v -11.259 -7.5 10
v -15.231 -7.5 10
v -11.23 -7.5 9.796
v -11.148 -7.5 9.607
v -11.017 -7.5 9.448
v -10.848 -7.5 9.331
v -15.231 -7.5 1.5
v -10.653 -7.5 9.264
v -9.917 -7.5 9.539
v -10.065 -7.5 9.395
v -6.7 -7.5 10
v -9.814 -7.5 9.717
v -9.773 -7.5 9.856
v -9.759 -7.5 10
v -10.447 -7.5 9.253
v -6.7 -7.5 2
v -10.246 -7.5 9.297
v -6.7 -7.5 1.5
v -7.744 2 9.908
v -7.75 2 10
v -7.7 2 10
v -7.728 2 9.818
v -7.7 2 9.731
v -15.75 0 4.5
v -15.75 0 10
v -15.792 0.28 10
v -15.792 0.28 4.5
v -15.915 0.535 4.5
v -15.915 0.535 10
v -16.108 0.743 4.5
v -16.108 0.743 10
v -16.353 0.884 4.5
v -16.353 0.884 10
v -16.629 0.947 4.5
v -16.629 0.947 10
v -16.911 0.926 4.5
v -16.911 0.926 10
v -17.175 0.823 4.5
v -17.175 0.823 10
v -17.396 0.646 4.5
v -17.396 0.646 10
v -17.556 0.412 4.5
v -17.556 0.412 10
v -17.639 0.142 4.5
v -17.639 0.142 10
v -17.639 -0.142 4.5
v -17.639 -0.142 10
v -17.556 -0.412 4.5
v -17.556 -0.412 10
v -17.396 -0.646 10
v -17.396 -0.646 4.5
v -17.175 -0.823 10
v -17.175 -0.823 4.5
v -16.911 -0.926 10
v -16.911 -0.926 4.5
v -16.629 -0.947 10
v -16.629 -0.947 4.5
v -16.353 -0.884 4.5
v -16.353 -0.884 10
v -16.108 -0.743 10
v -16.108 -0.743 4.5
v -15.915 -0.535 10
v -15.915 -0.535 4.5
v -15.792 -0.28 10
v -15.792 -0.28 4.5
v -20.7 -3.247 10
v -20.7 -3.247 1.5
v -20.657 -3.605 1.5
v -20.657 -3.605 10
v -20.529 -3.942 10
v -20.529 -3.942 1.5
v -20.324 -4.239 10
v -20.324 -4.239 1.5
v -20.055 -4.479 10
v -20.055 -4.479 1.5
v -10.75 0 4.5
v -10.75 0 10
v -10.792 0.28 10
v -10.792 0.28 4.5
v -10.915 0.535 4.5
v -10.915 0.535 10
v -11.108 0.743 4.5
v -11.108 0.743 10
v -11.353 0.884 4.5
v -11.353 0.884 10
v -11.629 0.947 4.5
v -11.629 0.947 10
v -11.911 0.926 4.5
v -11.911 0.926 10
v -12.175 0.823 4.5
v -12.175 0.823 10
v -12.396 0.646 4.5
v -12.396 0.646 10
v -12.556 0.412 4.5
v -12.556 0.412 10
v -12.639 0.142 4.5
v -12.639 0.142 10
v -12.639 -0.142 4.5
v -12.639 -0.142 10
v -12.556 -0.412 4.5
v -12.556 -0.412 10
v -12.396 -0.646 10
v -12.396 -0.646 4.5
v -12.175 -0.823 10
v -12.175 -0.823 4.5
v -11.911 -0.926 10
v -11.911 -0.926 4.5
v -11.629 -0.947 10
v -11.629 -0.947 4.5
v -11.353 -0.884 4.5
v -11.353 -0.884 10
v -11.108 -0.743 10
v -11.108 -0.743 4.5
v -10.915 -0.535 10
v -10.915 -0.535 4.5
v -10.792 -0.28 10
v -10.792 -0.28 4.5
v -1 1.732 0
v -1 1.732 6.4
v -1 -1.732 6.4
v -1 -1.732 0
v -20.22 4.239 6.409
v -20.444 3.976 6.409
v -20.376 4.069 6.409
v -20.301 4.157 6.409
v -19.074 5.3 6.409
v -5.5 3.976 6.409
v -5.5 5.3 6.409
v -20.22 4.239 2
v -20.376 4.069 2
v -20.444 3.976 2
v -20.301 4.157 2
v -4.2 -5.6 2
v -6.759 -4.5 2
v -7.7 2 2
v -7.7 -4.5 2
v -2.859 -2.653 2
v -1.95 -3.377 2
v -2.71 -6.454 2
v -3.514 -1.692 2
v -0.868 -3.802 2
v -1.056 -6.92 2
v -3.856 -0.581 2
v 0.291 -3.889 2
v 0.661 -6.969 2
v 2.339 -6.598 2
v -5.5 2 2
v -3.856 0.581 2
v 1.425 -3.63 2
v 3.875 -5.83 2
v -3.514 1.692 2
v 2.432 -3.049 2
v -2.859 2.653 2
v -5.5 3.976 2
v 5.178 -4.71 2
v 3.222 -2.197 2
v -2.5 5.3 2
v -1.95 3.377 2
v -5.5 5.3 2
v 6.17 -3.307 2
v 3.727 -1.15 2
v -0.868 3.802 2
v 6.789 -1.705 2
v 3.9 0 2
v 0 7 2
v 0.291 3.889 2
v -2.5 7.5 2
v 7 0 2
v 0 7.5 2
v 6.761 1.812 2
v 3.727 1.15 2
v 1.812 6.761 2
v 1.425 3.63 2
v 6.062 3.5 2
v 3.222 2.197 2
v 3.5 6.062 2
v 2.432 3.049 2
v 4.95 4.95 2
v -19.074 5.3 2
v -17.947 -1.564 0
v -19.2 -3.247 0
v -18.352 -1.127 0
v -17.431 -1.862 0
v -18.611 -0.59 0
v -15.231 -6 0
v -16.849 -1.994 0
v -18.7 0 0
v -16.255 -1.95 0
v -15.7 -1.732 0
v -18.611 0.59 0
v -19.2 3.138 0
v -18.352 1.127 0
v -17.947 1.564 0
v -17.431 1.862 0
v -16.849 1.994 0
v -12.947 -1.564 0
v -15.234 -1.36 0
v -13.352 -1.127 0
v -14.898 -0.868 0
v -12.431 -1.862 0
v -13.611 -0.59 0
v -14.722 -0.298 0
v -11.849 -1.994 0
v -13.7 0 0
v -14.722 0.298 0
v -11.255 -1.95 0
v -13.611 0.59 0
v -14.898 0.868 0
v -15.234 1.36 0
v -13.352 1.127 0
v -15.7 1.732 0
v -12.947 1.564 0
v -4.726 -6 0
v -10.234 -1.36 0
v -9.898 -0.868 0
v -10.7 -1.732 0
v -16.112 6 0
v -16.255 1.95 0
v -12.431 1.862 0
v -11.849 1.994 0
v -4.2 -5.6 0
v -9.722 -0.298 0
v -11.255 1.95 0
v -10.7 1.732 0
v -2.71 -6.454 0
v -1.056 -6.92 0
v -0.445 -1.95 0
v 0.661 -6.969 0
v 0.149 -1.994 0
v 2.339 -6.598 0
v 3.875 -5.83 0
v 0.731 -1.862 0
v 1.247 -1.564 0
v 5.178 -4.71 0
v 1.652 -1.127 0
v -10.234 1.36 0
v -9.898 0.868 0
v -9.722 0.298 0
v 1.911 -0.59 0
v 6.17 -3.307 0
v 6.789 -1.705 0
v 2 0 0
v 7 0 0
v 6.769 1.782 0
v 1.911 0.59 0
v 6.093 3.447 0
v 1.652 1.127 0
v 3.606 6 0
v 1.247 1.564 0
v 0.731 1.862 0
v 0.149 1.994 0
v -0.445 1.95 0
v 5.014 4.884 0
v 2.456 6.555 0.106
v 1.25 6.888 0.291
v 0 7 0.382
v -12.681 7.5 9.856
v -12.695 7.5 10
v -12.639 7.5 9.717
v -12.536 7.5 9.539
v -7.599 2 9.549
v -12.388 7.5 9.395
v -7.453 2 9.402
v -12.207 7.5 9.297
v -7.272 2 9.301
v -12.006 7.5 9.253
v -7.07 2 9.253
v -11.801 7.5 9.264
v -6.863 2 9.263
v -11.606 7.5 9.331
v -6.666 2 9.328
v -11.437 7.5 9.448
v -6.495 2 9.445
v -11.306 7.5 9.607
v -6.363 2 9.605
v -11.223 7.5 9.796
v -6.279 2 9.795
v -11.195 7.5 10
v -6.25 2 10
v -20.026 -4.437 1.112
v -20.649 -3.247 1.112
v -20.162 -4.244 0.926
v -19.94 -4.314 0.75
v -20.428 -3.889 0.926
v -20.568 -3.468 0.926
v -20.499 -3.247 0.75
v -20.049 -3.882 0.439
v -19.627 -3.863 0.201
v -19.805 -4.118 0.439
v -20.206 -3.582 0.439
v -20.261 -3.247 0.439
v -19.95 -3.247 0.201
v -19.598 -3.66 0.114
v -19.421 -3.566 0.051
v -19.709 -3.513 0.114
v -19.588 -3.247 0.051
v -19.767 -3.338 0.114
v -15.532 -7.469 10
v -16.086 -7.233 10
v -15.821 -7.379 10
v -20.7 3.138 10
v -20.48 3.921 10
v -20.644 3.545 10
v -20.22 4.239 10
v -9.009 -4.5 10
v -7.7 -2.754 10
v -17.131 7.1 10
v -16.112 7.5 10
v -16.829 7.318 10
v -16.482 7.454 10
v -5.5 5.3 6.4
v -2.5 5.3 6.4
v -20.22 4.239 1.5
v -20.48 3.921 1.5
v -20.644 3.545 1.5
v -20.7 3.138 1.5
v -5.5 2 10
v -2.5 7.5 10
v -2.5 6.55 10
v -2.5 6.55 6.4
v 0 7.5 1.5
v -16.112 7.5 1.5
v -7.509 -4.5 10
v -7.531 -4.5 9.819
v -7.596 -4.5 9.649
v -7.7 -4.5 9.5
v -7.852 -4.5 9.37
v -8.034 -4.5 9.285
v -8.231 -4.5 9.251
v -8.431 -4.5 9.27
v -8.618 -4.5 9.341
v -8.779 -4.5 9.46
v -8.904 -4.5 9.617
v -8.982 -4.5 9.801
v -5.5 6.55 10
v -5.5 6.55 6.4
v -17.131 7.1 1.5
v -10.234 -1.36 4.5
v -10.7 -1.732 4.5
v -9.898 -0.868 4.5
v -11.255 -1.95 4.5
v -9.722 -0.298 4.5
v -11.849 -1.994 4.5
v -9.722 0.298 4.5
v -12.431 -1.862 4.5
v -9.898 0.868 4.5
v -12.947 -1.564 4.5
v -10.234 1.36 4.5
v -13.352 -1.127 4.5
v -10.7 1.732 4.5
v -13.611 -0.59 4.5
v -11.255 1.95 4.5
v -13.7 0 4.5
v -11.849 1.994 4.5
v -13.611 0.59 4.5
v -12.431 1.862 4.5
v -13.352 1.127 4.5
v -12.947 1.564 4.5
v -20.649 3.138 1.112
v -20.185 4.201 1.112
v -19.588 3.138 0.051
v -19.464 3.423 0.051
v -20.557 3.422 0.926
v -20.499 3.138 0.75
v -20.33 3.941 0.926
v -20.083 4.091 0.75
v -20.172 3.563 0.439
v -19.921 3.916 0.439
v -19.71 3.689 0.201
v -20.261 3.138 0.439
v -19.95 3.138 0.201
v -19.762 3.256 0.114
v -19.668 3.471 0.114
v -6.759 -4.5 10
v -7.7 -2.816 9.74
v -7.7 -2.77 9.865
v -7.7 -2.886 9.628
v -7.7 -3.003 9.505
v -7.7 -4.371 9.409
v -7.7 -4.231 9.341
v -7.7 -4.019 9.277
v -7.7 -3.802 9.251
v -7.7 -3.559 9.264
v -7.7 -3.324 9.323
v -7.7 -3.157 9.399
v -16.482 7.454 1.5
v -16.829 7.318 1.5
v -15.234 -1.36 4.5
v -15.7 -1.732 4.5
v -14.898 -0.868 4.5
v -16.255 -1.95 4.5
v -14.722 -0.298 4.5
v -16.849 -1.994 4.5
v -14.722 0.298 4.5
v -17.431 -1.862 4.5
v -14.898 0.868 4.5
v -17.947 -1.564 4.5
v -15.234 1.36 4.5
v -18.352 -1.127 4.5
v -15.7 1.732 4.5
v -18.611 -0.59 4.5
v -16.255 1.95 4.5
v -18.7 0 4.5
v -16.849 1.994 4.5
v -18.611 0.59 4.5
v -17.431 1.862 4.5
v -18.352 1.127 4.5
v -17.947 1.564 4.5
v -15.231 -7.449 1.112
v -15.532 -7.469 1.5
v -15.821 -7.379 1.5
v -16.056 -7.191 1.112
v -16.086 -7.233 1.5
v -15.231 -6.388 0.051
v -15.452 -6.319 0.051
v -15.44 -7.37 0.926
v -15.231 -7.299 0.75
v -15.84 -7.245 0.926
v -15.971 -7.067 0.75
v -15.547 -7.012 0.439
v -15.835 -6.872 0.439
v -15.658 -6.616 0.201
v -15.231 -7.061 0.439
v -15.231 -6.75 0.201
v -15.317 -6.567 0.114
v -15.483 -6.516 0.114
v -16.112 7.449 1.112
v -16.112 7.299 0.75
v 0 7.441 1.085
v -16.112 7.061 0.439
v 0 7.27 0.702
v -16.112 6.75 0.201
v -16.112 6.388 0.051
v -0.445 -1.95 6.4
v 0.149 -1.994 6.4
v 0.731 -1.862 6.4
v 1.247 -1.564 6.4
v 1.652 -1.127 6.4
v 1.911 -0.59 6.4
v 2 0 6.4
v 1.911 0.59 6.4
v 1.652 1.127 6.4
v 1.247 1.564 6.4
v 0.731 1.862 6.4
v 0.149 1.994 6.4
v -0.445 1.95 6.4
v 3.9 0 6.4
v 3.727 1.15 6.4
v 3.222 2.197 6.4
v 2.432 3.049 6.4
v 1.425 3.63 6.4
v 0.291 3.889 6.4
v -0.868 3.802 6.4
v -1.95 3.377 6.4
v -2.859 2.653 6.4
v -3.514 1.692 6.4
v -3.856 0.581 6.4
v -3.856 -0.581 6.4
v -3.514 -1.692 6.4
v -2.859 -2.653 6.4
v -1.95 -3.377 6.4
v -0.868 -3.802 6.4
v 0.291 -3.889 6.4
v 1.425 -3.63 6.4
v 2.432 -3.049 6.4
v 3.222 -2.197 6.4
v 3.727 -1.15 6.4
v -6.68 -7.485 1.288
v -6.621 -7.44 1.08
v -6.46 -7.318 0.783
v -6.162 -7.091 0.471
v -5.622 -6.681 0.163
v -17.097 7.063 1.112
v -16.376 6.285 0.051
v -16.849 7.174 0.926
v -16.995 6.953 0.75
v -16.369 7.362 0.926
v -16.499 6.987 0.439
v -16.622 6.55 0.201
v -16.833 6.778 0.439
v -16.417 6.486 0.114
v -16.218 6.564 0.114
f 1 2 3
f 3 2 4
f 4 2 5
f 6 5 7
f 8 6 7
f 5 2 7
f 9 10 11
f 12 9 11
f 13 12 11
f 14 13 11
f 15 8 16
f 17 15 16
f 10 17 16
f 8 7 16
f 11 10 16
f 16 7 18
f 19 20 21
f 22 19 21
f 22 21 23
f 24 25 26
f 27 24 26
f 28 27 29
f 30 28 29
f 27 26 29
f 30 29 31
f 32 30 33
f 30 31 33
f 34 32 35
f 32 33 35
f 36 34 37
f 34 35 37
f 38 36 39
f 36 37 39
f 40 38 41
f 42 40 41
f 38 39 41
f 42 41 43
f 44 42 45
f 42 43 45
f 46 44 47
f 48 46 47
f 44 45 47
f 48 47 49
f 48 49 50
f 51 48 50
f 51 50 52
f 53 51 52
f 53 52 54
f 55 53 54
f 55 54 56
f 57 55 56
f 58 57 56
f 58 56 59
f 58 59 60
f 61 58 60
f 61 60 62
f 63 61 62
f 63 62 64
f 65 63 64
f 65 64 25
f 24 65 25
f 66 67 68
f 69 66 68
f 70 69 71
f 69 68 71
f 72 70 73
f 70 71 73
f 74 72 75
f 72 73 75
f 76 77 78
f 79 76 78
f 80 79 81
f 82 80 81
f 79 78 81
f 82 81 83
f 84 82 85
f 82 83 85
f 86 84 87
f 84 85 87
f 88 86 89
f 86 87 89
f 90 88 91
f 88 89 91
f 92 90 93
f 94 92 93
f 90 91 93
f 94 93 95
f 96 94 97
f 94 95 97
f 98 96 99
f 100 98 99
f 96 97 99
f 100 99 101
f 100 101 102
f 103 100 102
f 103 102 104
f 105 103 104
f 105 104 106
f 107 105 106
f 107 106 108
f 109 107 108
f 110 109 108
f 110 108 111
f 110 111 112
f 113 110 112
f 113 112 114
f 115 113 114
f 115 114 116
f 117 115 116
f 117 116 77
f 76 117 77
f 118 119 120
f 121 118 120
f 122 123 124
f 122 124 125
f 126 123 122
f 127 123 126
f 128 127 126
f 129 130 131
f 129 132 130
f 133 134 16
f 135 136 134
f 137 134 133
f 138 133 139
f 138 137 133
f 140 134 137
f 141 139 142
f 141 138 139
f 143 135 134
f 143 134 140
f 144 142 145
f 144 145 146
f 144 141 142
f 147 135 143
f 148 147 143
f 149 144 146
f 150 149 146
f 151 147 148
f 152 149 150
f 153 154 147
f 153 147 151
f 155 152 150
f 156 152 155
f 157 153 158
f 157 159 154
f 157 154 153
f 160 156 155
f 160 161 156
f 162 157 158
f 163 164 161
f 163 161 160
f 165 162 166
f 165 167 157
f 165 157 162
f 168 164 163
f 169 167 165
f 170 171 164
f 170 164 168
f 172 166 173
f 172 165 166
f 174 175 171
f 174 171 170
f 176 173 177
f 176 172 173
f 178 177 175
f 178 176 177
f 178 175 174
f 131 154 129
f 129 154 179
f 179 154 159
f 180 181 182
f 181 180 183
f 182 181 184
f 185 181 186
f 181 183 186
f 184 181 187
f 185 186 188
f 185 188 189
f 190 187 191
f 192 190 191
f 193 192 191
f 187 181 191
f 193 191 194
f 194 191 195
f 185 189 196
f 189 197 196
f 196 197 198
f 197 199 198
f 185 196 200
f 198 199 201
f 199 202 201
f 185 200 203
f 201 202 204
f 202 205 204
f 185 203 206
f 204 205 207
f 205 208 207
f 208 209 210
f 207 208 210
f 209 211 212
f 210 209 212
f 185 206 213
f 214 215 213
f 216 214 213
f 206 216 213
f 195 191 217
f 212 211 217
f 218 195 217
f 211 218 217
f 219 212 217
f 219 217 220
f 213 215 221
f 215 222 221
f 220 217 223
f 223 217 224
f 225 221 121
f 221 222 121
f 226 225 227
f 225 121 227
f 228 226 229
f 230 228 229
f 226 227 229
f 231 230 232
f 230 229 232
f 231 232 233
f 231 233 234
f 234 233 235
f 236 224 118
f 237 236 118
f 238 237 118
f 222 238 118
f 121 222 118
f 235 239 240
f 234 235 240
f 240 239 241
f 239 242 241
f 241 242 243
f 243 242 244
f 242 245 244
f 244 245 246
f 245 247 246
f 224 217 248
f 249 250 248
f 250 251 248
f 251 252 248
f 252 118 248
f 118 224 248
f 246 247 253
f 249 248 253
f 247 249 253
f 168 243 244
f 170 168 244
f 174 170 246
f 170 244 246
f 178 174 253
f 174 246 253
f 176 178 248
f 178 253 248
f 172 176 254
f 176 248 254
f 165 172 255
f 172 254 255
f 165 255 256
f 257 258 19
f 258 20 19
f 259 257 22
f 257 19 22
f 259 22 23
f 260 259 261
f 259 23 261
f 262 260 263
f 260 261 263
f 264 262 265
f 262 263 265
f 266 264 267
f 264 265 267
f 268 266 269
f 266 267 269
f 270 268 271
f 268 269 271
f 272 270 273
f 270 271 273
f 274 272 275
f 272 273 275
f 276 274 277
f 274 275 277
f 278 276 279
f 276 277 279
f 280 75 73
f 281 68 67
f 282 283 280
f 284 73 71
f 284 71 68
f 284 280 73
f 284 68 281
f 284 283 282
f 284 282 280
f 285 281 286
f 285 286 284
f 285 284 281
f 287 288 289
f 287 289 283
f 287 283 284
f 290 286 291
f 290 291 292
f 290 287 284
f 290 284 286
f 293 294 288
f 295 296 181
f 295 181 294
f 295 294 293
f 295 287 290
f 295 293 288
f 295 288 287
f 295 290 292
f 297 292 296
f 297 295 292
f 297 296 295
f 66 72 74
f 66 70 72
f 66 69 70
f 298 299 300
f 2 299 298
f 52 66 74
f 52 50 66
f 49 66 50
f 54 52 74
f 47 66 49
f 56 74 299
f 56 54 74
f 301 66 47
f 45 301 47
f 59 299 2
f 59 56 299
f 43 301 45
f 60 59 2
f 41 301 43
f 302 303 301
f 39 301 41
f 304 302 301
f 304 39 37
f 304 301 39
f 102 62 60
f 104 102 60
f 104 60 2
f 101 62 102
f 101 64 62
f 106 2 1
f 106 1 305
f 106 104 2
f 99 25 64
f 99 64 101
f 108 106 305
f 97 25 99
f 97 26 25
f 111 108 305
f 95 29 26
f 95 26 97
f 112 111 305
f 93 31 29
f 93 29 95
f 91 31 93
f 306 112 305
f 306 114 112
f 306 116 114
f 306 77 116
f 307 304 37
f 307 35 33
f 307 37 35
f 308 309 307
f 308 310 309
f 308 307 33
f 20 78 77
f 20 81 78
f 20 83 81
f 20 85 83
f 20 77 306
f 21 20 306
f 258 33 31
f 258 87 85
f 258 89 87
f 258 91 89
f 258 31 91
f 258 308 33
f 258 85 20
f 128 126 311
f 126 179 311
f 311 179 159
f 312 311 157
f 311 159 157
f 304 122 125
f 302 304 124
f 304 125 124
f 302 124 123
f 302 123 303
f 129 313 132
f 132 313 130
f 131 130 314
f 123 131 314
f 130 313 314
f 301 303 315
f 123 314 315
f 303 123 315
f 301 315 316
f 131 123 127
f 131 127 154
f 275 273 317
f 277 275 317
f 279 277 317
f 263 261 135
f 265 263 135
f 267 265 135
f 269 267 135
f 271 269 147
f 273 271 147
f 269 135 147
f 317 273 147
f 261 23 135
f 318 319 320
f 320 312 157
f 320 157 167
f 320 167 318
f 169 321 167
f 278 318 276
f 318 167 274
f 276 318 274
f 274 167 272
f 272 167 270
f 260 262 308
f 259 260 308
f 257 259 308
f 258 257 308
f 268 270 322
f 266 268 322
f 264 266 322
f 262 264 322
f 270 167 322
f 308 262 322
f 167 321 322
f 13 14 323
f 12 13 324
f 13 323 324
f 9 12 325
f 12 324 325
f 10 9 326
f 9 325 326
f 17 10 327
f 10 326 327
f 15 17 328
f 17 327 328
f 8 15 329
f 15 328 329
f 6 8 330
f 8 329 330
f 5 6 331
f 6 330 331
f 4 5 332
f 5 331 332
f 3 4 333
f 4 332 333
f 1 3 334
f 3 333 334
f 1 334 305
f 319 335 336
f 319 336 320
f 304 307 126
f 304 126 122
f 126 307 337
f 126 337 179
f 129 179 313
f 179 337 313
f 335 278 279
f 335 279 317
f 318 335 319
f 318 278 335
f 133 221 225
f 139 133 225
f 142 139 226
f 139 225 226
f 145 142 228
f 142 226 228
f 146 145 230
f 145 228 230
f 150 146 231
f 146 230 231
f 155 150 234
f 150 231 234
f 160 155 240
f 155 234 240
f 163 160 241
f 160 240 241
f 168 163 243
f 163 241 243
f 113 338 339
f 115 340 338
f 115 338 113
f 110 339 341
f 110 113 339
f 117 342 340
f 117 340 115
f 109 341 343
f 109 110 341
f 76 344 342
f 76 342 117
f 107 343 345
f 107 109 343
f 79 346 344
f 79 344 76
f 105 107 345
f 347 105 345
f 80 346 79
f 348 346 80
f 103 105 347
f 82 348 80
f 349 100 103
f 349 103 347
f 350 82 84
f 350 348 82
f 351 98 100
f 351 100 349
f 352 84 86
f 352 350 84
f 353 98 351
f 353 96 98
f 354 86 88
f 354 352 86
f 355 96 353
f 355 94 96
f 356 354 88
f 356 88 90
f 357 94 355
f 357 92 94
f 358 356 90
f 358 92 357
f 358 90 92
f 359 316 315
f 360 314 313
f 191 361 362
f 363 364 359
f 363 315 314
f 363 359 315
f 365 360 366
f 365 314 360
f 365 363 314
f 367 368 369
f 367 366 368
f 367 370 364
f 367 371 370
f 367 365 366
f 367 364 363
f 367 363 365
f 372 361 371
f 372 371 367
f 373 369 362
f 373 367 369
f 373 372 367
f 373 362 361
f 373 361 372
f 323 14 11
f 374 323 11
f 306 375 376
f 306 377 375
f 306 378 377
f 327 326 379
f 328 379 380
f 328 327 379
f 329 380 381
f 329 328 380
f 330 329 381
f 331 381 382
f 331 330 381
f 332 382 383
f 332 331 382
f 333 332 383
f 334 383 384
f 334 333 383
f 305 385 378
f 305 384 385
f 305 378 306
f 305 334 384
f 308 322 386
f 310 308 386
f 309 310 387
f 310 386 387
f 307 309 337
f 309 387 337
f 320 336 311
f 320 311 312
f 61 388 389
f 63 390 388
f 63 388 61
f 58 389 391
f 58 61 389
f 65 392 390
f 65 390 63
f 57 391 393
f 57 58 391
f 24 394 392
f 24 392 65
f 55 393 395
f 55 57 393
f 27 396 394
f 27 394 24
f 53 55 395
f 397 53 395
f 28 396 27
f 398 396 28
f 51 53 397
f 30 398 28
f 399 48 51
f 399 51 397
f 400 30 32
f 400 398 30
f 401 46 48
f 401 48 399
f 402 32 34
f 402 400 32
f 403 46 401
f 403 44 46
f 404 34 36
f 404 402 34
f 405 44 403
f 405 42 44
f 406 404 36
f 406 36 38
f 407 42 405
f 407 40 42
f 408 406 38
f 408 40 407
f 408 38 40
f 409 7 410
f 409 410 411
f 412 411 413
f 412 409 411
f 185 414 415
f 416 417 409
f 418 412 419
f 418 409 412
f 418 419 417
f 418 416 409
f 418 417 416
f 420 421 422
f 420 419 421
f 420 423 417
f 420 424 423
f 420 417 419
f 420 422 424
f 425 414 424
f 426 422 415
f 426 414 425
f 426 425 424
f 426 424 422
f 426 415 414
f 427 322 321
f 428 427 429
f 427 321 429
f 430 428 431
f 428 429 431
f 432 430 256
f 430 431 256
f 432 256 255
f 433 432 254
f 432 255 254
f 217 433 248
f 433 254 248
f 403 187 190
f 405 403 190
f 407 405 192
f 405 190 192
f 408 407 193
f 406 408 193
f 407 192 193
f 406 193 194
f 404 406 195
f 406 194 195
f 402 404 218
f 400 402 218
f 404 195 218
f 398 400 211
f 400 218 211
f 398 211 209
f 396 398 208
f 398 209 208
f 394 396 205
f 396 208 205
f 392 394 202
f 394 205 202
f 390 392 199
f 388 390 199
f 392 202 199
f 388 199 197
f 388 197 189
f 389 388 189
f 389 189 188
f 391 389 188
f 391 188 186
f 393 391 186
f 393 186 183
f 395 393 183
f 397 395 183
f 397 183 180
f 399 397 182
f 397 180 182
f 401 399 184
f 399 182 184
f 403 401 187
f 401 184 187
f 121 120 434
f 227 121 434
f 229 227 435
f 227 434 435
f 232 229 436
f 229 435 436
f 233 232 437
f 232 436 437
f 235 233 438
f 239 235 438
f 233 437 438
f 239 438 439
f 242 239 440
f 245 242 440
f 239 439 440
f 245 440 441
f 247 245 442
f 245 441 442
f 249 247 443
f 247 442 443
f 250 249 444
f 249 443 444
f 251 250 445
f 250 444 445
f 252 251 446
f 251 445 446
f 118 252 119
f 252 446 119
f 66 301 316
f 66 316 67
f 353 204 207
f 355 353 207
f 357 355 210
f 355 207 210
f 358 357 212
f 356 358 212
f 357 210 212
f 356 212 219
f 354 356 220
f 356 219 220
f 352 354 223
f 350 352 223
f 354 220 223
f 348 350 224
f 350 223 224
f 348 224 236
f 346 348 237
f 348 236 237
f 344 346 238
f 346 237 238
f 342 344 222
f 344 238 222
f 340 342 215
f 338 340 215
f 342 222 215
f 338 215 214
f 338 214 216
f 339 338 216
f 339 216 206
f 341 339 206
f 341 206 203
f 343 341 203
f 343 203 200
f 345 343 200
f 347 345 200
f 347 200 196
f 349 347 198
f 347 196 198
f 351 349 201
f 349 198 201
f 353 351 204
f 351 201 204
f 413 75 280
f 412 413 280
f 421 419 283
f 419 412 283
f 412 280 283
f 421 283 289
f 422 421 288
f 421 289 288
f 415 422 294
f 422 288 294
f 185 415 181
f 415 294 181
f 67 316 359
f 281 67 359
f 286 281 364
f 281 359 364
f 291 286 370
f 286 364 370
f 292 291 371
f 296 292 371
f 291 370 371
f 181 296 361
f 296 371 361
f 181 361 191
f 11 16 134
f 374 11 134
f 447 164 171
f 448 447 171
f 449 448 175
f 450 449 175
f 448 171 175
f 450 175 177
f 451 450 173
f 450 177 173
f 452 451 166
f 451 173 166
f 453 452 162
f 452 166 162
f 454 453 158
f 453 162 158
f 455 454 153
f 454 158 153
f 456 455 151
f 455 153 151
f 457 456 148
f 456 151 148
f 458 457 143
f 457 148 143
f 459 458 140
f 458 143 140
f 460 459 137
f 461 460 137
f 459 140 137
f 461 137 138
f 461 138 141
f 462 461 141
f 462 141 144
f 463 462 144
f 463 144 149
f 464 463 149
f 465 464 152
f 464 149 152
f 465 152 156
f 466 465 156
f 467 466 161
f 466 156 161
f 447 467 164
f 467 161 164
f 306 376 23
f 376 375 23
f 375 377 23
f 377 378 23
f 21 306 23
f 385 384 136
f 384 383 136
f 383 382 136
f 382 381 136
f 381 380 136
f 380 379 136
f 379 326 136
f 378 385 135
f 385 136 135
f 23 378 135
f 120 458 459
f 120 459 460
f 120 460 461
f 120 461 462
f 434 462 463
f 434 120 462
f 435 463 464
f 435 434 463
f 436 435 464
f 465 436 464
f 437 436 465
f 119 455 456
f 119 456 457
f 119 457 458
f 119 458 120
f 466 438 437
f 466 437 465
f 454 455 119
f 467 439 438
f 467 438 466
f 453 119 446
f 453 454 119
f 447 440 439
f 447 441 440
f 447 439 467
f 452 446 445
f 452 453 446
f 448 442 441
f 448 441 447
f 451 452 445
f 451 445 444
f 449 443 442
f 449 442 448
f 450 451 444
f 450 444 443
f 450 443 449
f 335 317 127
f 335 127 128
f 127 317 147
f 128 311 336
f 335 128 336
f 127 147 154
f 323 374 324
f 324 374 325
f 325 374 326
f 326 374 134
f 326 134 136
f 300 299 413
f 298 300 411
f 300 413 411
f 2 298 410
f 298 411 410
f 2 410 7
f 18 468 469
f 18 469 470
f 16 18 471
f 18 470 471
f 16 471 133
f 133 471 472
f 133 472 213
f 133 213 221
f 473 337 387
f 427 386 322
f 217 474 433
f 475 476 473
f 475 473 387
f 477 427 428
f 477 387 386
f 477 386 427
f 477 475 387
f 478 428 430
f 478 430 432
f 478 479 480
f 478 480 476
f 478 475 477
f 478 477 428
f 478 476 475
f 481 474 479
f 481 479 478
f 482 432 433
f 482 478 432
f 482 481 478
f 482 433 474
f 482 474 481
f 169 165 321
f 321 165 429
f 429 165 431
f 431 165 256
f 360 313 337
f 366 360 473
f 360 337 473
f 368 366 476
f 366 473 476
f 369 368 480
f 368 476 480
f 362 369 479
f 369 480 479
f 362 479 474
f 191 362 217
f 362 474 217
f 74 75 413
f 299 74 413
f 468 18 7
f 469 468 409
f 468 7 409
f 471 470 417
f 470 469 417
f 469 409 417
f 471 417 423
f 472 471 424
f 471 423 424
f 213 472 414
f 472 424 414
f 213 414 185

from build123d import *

# Parameters (mm, degrees)
BOSS_EXTRUDE1_DEPTH      = 2
BOSS_EXTRUDE2_DEPTH      = 8
SKETCH24_R               = 3.9
BOSS_EXTRUDE5_DEPTH      = 4.4
SKETCH30_W               = 4.40861202
SKETCH30_H               = 1.324178481
CUT_EXTRUDE12_DEPTH      = 16
CUT_EXTRUDE11_DEPTH      = 23.928148639
FILLET1_R                = 1.5
SKETCH34_R               = 0.75
CUT_EXTRUDE13_DEPTH      = 8
SKETCH35_R               = 0.75
CUT_EXTRUDE14_DEPTH      = 3
CUT_EXTRUDE14_DEPTH_BACK = 8
SKETCH36_R               = 0.95
CUT_EXTRUDE15_DEPTH      = 8
SKETCH37_R               = 2
CUT_EXTRUDE16_DEPTH      = 4.5
SKETCH38_W               = 3
SKETCH38_H               = 1.25
CUT_EXTRUDE17_DEPTH      = 3.6


with BuildPart() as part:
    # Sketch2 → Boss-Extrude1 (new body)
    with BuildSketch(Plane.XY):
        with BuildLine():
            Line((-2.5, 7.5), (-16.7, 7.5))
            Line((-16.7, 7.5), (-20.7, 3.793442666))
            Line((-20.7, 3.793442666), (-20.7, -4.031648778))
            Line((-20.7, -4.031648778), (-15.7, -7.5))
            Line((-15.7, -7.5), (-6.7, -7.5))
            Line((-6.7, -7.5), (-4.2, -5.6))
            ThreePointArc((-4.2, -5.6), (3.130495168, -6.260990337), (7, 0))
            ThreePointArc((7, 0), (4.949747468, 4.949747468), (0, 7))
            Line((0, 7), (0, 7.5))
            Line((0, 7.5), (-2.5, 7.5))
        make_face()
    extrude(amount=BOSS_EXTRUDE1_DEPTH)

    # Sketch4 → Boss-Extrude2 (add)
    with BuildSketch(Plane.XY.offset(2)):
        Polygon((-15.7, -7.5), (-6.7, -7.5), (-6.759079174, -4.5), (-7.7, -4.5), (-7.7, 2), (-5.5, 2), (-5.5, 5.3), (-2.5, 5.3), (-2.5, 7.5), (-16.7, 7.5), (-20.7, 3.793442666), (-20.7, -4.031648778), align=None)
    extrude(amount=BOSS_EXTRUDE2_DEPTH)

    # Sketch24 → Boss-Extrude5 (add)
    with BuildSketch(Plane.XY.offset(2)):
        Circle(SKETCH24_R)
    extrude(amount=BOSS_EXTRUDE5_DEPTH)

    # Sketch30 → Cut-Extrude12 (cut)
    with BuildSketch(Plane(origin=(-5.5, 0, 0), x_dir=(0, 0, -1), z_dir=(1, 0, 0))):
        with Locations((-4.20430601, 4.63791076)):
            Rectangle(SKETCH30_W, SKETCH30_H)
    extrude(amount=-CUT_EXTRUDE12_DEPTH, mode=Mode.SUBTRACT)

    # Sketch28 → Cut-Extrude11 (cut, through all)
    with BuildSketch(Plane.XY.offset(6.4)):
        with BuildLine():
            Line((-1, 1.732050808), (-1, -1.732050808))
            ThreePointArc((-1, -1.732050808), (2, 0), (-1, 1.732050808))
        make_face()
    extrude(amount=-CUT_EXTRUDE11_DEPTH, mode=Mode.SUBTRACT)

    # Fillet1
    # the kernel refuses this fillet: 1.5 mm, written as the material it takes off along each edge
    with BuildSketch(Plane(origin=(-15.230677435, -6, 1.5), x_dir=(-0.5699665637840448, -0.8216678867816415, 0), z_dir=(0, 0, -1))) as fillet1_piece_1_section:
        Polygon((0, 0), (FILLET1_R * 1.02, 0), (FILLET1_R * 1.02, -FILLET1_R * 0.319139344377), (FILLET1_R * 0.838101244517, -FILLET1_R * 0.58136589506), align=None)
    fillet1_piece_1 = extrude(amount=FILLET1_R * 1.02, mode=Mode.PRIVATE)
    fillet1_piece_1 = fillet1_piece_1 - Plane(origin=(-15.230677435, -6, 1.5), x_dir=(0.29860685961507855, 0.9543762064253388, 0), z_dir=(0, 0, -1)) * Sphere(FILLET1_R, mode=Mode.PRIVATE)
    add(fillet1_piece_1, mode=Mode.SUBTRACT)
    with BuildSketch(Plane(origin=(-16.11186344, 6, 1.5), x_dir=(-0.6796897201843015, 0.7334997506991983, 0), z_dir=(0, 0, -1))) as fillet1_piece_2_section:
        Polygon((0, 0), (FILLET1_R * 1.02, 0), (FILLET1_R * 1.02, FILLET1_R * 0.399932860855), (FILLET1_R * 0.748169745713, FILLET1_R * 0.693283514588), align=None)
    fillet1_piece_2 = extrude(amount=FILLET1_R * 1.02, mode=Mode.PRIVATE)
    fillet1_piece_2 = fillet1_piece_2 - Plane(origin=(-16.11186344, 6, 1.5), x_dir=(0.3650344157067945, -0.9309940254102596, 0), z_dir=(0, 0, -1)) * Sphere(FILLET1_R, mode=Mode.PRIVATE)
    add(fillet1_piece_2, mode=Mode.SUBTRACT)
    with BuildSketch(Plane(origin=(-19.2, 3.138411196, 1.5), x_dir=(-0.6796897201843015, 0.7334997506991983, 0), z_dir=(0, 0, -1))) as fillet1_piece_3_section:
        Polygon((0, 0), (FILLET1_R * 1.02, 0), (FILLET1_R * 1.02, -FILLET1_R * 0.445421399395), (FILLET1_R * 0.693283514588, -FILLET1_R * 0.748169745713), align=None)
    fillet1_piece_3 = extrude(amount=FILLET1_R * 1.02, mode=Mode.PRIVATE)
    fillet1_piece_3 = fillet1_piece_3 - Plane(origin=(-19.2, 3.138411196, 1.5), x_dir=(0.9164304993244992, -0.40019387789901173, 0), z_dir=(0, 0, -1)) * Sphere(FILLET1_R, mode=Mode.PRIVATE)
    add(fillet1_piece_3, mode=Mode.SUBTRACT)
    with BuildSketch(Plane(origin=(-19.2, -3.246599046, 1.5), x_dir=(-0.5699665637840448, -0.8216678867816415, 0), z_dir=(0, 0, -1))) as fillet1_piece_4_section:
        Polygon((0, 0), (FILLET1_R * 1.02, 0), (FILLET1_R * 1.02, FILLET1_R * 0.533833817771), (FILLET1_R * 0.58136589506, FILLET1_R * 0.838101244517), align=None)
    fillet1_piece_4 = extrude(amount=FILLET1_R * 1.02, mode=Mode.PRIVATE)
    fillet1_piece_4 = fillet1_piece_4 - Plane(origin=(-19.2, -3.246599046, 1.5), x_dir=(0.8859928227090906, 0.46369895202380795, 0), z_dir=(0, 0, -1)) * Sphere(FILLET1_R, mode=Mode.PRIVATE)
    add(fillet1_piece_4, mode=Mode.SUBTRACT)
    with BuildSketch(Plane(origin=(-15.230677435, -7.5, 0), x_dir=(0, 1, 0), z_dir=(1, 0, 0))) as fillet1_piece_5_section:
        with BuildLine():
            CenterArc((FILLET1_R, FILLET1_R), FILLET1_R, 180, 90)
            Line((0, FILLET1_R), (0, 0))
            Line((0, 0), (FILLET1_R, 0))
        make_face()
    fillet1_piece_5 = extrude(amount=12.280677435, mode=Mode.PRIVATE)
    fillet1_piece_5 = split(fillet1_piece_5, bisect_by=Plane(origin=(-9.092127217, -9.318016685, 0.3282266), z_dir=(-0.6050832675335577, 0.7961621941231027, 0)), keep=Keep.TOP, mode=Mode.PRIVATE)
    add(fillet1_piece_5, mode=Mode.SUBTRACT)
    with BuildSketch(Plane(origin=(3.75, 7.5, 0), x_dir=(0, 0, 1), z_dir=(-1, 0, 0))) as fillet1_piece_6:
        with BuildLine():
            CenterArc((FILLET1_R, -FILLET1_R), FILLET1_R, 90, 90)
            Line((0, -FILLET1_R), (0, 0))
            Line((0, 0), (FILLET1_R, 0))
        make_face()
    extrude(amount=19.86186344, mode=Mode.SUBTRACT)
    with BuildSketch(Plane(origin=(-17.13139802, 7.100249626, 0), x_dir=(0.6796897201843014, -0.7334997506991981, 0), z_dir=(-0.7334997506991983, -0.6796897201843015, 0))) as fillet1_piece_7:
        with BuildLine():
            CenterArc((FILLET1_R, FILLET1_R), FILLET1_R, 180, 90)
            Line((0, FILLET1_R), (0, 0))
            Line((0, 0), (FILLET1_R, 0))
        make_face()
    extrude(amount=4.21013989, mode=Mode.SUBTRACT)
    with BuildSketch(Plane(origin=(-20.054949846, -4.479100876, 0), x_dir=(0.5699665637840448, 0.8216678867816416, 0), z_dir=(0.8216678867816415, -0.5699665637840448, 0))) as fillet1_piece_8:
        with BuildLine():
            CenterArc((FILLET1_R, FILLET1_R), FILLET1_R, 180, 90)
            Line((0, FILLET1_R), (0, 0))
            Line((0, 0), (FILLET1_R, 0))
        make_face()
    extrude(amount=4.830811364, mode=Mode.SUBTRACT)
    with BuildSketch(Plane(origin=(-20.7, 3.138411196, 0), x_dir=(1, 0, 0), z_dir=(0, -1, 0))) as fillet1_piece_9:
        with BuildLine():
            CenterArc((FILLET1_R, FILLET1_R), FILLET1_R, 180, 90)
            Line((0, FILLET1_R), (0, 0))
            Line((0, 0), (FILLET1_R, 0))
        make_face()
    extrude(amount=6.385010242, mode=Mode.SUBTRACT)
    with BuildSketch(Plane(origin=(-15.7, -7.5, 1.5), x_dir=(1, 0, 0), z_dir=(0, 0, 1))) as fillet1_piece_10:
        with BuildLine():
            CenterArc((FILLET1_R * 0.312881710173, FILLET1_R), FILLET1_R, 235.252105822, 34.747894178)
            Line((-FILLET1_R * 0.257084853611, FILLET1_R * 0.178332113218), (0, 0))
            Line((0, 0), (FILLET1_R * 0.312881710173, 0))
        make_face()
    extrude(amount=9.673306413, mode=Mode.SUBTRACT)
    with BuildSketch(Plane(origin=(-20.7, -4.031648778, 1.5), x_dir=(0, 1, 0), z_dir=(0, 0, 1))) as fillet1_piece_11:
        with BuildLine():
            CenterArc((FILLET1_R * 0.523366488011, -FILLET1_R), FILLET1_R, 90, 55.252105822)
            Line((-FILLET1_R * 0.298301398771, -FILLET1_R * 0.430033436216), (0, 0))
            Line((0, 0), (FILLET1_R * 0.523366488011, 0))
        make_face()
    extrude(amount=10.46262433, mode=Mode.SUBTRACT)
    with BuildSketch(Plane(origin=(-20.7, 3.793442666, 1.5), x_dir=(0.7334997506991984, 0.6796897201843014, 0), z_dir=(0, 0, 1))) as fillet1_piece_12:
        with BuildLine():
            CenterArc((FILLET1_R * 0.436687646465, -FILLET1_R), FILLET1_R, 90, 47.18059856)
            Line((-FILLET1_R * 0.296812104234, -FILLET1_R * 0.320310279816), (0, 0))
            Line((0, 0), (FILLET1_R * 0.436687646465, 0))
        make_face()
    extrude(amount=10.137578674, mode=Mode.SUBTRACT)
    with BuildSketch(Plane(origin=(-16.7, 7.5, 1.5), x_dir=(1, 0, 0), z_dir=(0, 0, 1))) as fillet1_piece_13:
        with BuildLine():
            CenterArc((FILLET1_R * 0.392091040054, -FILLET1_R), FILLET1_R, 90, 42.81940144)
            Line((-FILLET1_R * 0.287598680131, -FILLET1_R * 0.266500249301), (0, 0))
            Line((0, 0), (FILLET1_R * 0.392091040054, 0))
        make_face()
    extrude(amount=9.9703414, mode=Mode.SUBTRACT)

    # Sketch34 → Cut-Extrude13 (cut, along a direction that is not the sketch's normal)
    with BuildSketch(Plane.XZ.offset(-2)):
        with Locations((-7, 10)):
            Circle(SKETCH34_R)
    extrude(amount=-CUT_EXTRUDE13_DEPTH, dir=(0.6685833876565112, -0.7436371788377336, 0), mode=Mode.SUBTRACT)

    # Sketch35 → Cut-Extrude14 (cut, two sides, along a direction that is not the sketch's normal)
    with BuildSketch(Plane(origin=(0, -4.5, 0), x_dir=(1, 0, 0), z_dir=(0, 1, 0))) as cut_extrude14_sk:
        with Locations((-8.259079174, -10)):
            Circle(SKETCH35_R)
    extrude(amount=CUT_EXTRUDE14_DEPTH, dir=(0.5999194182208608, 0.8000604299935998, 0), mode=Mode.SUBTRACT)
    extrude(cut_extrude14_sk.sketch, amount=-CUT_EXTRUDE14_DEPTH_BACK, dir=(0.5999194182208608, 0.8000604299935998, 0), mode=Mode.SUBTRACT)

    # Sketch36 → Cut-Extrude15 (cut)
    with BuildSketch(Plane.XY.offset(10)):
        with Locations((-11.7, 0)):
            Circle(SKETCH36_R)
        with Locations((-16.7, 0)):
            Circle(SKETCH36_R)
    extrude(amount=-CUT_EXTRUDE15_DEPTH, mode=Mode.SUBTRACT)

    # Sketch37 → Cut-Extrude16 (cut)
    with BuildSketch(Plane(origin=(0, 0, 0), x_dir=(-1, 0, 0), z_dir=(0, 0, -1))):
        with Locations((11.7, 0)):
            Circle(SKETCH37_R)
        with Locations((16.7, 0)):
            Circle(SKETCH37_R)
    extrude(amount=-CUT_EXTRUDE16_DEPTH, mode=Mode.SUBTRACT)

    # Sketch38 → Cut-Extrude17 (cut)
    with BuildSketch(Plane.XY.offset(10)):
        with Locations((-4, 5.925)):
            Rectangle(SKETCH38_W, SKETCH38_H)
    extrude(amount=-CUT_EXTRUDE17_DEPTH, mode=Mode.SUBTRACT)


solid = part.part
